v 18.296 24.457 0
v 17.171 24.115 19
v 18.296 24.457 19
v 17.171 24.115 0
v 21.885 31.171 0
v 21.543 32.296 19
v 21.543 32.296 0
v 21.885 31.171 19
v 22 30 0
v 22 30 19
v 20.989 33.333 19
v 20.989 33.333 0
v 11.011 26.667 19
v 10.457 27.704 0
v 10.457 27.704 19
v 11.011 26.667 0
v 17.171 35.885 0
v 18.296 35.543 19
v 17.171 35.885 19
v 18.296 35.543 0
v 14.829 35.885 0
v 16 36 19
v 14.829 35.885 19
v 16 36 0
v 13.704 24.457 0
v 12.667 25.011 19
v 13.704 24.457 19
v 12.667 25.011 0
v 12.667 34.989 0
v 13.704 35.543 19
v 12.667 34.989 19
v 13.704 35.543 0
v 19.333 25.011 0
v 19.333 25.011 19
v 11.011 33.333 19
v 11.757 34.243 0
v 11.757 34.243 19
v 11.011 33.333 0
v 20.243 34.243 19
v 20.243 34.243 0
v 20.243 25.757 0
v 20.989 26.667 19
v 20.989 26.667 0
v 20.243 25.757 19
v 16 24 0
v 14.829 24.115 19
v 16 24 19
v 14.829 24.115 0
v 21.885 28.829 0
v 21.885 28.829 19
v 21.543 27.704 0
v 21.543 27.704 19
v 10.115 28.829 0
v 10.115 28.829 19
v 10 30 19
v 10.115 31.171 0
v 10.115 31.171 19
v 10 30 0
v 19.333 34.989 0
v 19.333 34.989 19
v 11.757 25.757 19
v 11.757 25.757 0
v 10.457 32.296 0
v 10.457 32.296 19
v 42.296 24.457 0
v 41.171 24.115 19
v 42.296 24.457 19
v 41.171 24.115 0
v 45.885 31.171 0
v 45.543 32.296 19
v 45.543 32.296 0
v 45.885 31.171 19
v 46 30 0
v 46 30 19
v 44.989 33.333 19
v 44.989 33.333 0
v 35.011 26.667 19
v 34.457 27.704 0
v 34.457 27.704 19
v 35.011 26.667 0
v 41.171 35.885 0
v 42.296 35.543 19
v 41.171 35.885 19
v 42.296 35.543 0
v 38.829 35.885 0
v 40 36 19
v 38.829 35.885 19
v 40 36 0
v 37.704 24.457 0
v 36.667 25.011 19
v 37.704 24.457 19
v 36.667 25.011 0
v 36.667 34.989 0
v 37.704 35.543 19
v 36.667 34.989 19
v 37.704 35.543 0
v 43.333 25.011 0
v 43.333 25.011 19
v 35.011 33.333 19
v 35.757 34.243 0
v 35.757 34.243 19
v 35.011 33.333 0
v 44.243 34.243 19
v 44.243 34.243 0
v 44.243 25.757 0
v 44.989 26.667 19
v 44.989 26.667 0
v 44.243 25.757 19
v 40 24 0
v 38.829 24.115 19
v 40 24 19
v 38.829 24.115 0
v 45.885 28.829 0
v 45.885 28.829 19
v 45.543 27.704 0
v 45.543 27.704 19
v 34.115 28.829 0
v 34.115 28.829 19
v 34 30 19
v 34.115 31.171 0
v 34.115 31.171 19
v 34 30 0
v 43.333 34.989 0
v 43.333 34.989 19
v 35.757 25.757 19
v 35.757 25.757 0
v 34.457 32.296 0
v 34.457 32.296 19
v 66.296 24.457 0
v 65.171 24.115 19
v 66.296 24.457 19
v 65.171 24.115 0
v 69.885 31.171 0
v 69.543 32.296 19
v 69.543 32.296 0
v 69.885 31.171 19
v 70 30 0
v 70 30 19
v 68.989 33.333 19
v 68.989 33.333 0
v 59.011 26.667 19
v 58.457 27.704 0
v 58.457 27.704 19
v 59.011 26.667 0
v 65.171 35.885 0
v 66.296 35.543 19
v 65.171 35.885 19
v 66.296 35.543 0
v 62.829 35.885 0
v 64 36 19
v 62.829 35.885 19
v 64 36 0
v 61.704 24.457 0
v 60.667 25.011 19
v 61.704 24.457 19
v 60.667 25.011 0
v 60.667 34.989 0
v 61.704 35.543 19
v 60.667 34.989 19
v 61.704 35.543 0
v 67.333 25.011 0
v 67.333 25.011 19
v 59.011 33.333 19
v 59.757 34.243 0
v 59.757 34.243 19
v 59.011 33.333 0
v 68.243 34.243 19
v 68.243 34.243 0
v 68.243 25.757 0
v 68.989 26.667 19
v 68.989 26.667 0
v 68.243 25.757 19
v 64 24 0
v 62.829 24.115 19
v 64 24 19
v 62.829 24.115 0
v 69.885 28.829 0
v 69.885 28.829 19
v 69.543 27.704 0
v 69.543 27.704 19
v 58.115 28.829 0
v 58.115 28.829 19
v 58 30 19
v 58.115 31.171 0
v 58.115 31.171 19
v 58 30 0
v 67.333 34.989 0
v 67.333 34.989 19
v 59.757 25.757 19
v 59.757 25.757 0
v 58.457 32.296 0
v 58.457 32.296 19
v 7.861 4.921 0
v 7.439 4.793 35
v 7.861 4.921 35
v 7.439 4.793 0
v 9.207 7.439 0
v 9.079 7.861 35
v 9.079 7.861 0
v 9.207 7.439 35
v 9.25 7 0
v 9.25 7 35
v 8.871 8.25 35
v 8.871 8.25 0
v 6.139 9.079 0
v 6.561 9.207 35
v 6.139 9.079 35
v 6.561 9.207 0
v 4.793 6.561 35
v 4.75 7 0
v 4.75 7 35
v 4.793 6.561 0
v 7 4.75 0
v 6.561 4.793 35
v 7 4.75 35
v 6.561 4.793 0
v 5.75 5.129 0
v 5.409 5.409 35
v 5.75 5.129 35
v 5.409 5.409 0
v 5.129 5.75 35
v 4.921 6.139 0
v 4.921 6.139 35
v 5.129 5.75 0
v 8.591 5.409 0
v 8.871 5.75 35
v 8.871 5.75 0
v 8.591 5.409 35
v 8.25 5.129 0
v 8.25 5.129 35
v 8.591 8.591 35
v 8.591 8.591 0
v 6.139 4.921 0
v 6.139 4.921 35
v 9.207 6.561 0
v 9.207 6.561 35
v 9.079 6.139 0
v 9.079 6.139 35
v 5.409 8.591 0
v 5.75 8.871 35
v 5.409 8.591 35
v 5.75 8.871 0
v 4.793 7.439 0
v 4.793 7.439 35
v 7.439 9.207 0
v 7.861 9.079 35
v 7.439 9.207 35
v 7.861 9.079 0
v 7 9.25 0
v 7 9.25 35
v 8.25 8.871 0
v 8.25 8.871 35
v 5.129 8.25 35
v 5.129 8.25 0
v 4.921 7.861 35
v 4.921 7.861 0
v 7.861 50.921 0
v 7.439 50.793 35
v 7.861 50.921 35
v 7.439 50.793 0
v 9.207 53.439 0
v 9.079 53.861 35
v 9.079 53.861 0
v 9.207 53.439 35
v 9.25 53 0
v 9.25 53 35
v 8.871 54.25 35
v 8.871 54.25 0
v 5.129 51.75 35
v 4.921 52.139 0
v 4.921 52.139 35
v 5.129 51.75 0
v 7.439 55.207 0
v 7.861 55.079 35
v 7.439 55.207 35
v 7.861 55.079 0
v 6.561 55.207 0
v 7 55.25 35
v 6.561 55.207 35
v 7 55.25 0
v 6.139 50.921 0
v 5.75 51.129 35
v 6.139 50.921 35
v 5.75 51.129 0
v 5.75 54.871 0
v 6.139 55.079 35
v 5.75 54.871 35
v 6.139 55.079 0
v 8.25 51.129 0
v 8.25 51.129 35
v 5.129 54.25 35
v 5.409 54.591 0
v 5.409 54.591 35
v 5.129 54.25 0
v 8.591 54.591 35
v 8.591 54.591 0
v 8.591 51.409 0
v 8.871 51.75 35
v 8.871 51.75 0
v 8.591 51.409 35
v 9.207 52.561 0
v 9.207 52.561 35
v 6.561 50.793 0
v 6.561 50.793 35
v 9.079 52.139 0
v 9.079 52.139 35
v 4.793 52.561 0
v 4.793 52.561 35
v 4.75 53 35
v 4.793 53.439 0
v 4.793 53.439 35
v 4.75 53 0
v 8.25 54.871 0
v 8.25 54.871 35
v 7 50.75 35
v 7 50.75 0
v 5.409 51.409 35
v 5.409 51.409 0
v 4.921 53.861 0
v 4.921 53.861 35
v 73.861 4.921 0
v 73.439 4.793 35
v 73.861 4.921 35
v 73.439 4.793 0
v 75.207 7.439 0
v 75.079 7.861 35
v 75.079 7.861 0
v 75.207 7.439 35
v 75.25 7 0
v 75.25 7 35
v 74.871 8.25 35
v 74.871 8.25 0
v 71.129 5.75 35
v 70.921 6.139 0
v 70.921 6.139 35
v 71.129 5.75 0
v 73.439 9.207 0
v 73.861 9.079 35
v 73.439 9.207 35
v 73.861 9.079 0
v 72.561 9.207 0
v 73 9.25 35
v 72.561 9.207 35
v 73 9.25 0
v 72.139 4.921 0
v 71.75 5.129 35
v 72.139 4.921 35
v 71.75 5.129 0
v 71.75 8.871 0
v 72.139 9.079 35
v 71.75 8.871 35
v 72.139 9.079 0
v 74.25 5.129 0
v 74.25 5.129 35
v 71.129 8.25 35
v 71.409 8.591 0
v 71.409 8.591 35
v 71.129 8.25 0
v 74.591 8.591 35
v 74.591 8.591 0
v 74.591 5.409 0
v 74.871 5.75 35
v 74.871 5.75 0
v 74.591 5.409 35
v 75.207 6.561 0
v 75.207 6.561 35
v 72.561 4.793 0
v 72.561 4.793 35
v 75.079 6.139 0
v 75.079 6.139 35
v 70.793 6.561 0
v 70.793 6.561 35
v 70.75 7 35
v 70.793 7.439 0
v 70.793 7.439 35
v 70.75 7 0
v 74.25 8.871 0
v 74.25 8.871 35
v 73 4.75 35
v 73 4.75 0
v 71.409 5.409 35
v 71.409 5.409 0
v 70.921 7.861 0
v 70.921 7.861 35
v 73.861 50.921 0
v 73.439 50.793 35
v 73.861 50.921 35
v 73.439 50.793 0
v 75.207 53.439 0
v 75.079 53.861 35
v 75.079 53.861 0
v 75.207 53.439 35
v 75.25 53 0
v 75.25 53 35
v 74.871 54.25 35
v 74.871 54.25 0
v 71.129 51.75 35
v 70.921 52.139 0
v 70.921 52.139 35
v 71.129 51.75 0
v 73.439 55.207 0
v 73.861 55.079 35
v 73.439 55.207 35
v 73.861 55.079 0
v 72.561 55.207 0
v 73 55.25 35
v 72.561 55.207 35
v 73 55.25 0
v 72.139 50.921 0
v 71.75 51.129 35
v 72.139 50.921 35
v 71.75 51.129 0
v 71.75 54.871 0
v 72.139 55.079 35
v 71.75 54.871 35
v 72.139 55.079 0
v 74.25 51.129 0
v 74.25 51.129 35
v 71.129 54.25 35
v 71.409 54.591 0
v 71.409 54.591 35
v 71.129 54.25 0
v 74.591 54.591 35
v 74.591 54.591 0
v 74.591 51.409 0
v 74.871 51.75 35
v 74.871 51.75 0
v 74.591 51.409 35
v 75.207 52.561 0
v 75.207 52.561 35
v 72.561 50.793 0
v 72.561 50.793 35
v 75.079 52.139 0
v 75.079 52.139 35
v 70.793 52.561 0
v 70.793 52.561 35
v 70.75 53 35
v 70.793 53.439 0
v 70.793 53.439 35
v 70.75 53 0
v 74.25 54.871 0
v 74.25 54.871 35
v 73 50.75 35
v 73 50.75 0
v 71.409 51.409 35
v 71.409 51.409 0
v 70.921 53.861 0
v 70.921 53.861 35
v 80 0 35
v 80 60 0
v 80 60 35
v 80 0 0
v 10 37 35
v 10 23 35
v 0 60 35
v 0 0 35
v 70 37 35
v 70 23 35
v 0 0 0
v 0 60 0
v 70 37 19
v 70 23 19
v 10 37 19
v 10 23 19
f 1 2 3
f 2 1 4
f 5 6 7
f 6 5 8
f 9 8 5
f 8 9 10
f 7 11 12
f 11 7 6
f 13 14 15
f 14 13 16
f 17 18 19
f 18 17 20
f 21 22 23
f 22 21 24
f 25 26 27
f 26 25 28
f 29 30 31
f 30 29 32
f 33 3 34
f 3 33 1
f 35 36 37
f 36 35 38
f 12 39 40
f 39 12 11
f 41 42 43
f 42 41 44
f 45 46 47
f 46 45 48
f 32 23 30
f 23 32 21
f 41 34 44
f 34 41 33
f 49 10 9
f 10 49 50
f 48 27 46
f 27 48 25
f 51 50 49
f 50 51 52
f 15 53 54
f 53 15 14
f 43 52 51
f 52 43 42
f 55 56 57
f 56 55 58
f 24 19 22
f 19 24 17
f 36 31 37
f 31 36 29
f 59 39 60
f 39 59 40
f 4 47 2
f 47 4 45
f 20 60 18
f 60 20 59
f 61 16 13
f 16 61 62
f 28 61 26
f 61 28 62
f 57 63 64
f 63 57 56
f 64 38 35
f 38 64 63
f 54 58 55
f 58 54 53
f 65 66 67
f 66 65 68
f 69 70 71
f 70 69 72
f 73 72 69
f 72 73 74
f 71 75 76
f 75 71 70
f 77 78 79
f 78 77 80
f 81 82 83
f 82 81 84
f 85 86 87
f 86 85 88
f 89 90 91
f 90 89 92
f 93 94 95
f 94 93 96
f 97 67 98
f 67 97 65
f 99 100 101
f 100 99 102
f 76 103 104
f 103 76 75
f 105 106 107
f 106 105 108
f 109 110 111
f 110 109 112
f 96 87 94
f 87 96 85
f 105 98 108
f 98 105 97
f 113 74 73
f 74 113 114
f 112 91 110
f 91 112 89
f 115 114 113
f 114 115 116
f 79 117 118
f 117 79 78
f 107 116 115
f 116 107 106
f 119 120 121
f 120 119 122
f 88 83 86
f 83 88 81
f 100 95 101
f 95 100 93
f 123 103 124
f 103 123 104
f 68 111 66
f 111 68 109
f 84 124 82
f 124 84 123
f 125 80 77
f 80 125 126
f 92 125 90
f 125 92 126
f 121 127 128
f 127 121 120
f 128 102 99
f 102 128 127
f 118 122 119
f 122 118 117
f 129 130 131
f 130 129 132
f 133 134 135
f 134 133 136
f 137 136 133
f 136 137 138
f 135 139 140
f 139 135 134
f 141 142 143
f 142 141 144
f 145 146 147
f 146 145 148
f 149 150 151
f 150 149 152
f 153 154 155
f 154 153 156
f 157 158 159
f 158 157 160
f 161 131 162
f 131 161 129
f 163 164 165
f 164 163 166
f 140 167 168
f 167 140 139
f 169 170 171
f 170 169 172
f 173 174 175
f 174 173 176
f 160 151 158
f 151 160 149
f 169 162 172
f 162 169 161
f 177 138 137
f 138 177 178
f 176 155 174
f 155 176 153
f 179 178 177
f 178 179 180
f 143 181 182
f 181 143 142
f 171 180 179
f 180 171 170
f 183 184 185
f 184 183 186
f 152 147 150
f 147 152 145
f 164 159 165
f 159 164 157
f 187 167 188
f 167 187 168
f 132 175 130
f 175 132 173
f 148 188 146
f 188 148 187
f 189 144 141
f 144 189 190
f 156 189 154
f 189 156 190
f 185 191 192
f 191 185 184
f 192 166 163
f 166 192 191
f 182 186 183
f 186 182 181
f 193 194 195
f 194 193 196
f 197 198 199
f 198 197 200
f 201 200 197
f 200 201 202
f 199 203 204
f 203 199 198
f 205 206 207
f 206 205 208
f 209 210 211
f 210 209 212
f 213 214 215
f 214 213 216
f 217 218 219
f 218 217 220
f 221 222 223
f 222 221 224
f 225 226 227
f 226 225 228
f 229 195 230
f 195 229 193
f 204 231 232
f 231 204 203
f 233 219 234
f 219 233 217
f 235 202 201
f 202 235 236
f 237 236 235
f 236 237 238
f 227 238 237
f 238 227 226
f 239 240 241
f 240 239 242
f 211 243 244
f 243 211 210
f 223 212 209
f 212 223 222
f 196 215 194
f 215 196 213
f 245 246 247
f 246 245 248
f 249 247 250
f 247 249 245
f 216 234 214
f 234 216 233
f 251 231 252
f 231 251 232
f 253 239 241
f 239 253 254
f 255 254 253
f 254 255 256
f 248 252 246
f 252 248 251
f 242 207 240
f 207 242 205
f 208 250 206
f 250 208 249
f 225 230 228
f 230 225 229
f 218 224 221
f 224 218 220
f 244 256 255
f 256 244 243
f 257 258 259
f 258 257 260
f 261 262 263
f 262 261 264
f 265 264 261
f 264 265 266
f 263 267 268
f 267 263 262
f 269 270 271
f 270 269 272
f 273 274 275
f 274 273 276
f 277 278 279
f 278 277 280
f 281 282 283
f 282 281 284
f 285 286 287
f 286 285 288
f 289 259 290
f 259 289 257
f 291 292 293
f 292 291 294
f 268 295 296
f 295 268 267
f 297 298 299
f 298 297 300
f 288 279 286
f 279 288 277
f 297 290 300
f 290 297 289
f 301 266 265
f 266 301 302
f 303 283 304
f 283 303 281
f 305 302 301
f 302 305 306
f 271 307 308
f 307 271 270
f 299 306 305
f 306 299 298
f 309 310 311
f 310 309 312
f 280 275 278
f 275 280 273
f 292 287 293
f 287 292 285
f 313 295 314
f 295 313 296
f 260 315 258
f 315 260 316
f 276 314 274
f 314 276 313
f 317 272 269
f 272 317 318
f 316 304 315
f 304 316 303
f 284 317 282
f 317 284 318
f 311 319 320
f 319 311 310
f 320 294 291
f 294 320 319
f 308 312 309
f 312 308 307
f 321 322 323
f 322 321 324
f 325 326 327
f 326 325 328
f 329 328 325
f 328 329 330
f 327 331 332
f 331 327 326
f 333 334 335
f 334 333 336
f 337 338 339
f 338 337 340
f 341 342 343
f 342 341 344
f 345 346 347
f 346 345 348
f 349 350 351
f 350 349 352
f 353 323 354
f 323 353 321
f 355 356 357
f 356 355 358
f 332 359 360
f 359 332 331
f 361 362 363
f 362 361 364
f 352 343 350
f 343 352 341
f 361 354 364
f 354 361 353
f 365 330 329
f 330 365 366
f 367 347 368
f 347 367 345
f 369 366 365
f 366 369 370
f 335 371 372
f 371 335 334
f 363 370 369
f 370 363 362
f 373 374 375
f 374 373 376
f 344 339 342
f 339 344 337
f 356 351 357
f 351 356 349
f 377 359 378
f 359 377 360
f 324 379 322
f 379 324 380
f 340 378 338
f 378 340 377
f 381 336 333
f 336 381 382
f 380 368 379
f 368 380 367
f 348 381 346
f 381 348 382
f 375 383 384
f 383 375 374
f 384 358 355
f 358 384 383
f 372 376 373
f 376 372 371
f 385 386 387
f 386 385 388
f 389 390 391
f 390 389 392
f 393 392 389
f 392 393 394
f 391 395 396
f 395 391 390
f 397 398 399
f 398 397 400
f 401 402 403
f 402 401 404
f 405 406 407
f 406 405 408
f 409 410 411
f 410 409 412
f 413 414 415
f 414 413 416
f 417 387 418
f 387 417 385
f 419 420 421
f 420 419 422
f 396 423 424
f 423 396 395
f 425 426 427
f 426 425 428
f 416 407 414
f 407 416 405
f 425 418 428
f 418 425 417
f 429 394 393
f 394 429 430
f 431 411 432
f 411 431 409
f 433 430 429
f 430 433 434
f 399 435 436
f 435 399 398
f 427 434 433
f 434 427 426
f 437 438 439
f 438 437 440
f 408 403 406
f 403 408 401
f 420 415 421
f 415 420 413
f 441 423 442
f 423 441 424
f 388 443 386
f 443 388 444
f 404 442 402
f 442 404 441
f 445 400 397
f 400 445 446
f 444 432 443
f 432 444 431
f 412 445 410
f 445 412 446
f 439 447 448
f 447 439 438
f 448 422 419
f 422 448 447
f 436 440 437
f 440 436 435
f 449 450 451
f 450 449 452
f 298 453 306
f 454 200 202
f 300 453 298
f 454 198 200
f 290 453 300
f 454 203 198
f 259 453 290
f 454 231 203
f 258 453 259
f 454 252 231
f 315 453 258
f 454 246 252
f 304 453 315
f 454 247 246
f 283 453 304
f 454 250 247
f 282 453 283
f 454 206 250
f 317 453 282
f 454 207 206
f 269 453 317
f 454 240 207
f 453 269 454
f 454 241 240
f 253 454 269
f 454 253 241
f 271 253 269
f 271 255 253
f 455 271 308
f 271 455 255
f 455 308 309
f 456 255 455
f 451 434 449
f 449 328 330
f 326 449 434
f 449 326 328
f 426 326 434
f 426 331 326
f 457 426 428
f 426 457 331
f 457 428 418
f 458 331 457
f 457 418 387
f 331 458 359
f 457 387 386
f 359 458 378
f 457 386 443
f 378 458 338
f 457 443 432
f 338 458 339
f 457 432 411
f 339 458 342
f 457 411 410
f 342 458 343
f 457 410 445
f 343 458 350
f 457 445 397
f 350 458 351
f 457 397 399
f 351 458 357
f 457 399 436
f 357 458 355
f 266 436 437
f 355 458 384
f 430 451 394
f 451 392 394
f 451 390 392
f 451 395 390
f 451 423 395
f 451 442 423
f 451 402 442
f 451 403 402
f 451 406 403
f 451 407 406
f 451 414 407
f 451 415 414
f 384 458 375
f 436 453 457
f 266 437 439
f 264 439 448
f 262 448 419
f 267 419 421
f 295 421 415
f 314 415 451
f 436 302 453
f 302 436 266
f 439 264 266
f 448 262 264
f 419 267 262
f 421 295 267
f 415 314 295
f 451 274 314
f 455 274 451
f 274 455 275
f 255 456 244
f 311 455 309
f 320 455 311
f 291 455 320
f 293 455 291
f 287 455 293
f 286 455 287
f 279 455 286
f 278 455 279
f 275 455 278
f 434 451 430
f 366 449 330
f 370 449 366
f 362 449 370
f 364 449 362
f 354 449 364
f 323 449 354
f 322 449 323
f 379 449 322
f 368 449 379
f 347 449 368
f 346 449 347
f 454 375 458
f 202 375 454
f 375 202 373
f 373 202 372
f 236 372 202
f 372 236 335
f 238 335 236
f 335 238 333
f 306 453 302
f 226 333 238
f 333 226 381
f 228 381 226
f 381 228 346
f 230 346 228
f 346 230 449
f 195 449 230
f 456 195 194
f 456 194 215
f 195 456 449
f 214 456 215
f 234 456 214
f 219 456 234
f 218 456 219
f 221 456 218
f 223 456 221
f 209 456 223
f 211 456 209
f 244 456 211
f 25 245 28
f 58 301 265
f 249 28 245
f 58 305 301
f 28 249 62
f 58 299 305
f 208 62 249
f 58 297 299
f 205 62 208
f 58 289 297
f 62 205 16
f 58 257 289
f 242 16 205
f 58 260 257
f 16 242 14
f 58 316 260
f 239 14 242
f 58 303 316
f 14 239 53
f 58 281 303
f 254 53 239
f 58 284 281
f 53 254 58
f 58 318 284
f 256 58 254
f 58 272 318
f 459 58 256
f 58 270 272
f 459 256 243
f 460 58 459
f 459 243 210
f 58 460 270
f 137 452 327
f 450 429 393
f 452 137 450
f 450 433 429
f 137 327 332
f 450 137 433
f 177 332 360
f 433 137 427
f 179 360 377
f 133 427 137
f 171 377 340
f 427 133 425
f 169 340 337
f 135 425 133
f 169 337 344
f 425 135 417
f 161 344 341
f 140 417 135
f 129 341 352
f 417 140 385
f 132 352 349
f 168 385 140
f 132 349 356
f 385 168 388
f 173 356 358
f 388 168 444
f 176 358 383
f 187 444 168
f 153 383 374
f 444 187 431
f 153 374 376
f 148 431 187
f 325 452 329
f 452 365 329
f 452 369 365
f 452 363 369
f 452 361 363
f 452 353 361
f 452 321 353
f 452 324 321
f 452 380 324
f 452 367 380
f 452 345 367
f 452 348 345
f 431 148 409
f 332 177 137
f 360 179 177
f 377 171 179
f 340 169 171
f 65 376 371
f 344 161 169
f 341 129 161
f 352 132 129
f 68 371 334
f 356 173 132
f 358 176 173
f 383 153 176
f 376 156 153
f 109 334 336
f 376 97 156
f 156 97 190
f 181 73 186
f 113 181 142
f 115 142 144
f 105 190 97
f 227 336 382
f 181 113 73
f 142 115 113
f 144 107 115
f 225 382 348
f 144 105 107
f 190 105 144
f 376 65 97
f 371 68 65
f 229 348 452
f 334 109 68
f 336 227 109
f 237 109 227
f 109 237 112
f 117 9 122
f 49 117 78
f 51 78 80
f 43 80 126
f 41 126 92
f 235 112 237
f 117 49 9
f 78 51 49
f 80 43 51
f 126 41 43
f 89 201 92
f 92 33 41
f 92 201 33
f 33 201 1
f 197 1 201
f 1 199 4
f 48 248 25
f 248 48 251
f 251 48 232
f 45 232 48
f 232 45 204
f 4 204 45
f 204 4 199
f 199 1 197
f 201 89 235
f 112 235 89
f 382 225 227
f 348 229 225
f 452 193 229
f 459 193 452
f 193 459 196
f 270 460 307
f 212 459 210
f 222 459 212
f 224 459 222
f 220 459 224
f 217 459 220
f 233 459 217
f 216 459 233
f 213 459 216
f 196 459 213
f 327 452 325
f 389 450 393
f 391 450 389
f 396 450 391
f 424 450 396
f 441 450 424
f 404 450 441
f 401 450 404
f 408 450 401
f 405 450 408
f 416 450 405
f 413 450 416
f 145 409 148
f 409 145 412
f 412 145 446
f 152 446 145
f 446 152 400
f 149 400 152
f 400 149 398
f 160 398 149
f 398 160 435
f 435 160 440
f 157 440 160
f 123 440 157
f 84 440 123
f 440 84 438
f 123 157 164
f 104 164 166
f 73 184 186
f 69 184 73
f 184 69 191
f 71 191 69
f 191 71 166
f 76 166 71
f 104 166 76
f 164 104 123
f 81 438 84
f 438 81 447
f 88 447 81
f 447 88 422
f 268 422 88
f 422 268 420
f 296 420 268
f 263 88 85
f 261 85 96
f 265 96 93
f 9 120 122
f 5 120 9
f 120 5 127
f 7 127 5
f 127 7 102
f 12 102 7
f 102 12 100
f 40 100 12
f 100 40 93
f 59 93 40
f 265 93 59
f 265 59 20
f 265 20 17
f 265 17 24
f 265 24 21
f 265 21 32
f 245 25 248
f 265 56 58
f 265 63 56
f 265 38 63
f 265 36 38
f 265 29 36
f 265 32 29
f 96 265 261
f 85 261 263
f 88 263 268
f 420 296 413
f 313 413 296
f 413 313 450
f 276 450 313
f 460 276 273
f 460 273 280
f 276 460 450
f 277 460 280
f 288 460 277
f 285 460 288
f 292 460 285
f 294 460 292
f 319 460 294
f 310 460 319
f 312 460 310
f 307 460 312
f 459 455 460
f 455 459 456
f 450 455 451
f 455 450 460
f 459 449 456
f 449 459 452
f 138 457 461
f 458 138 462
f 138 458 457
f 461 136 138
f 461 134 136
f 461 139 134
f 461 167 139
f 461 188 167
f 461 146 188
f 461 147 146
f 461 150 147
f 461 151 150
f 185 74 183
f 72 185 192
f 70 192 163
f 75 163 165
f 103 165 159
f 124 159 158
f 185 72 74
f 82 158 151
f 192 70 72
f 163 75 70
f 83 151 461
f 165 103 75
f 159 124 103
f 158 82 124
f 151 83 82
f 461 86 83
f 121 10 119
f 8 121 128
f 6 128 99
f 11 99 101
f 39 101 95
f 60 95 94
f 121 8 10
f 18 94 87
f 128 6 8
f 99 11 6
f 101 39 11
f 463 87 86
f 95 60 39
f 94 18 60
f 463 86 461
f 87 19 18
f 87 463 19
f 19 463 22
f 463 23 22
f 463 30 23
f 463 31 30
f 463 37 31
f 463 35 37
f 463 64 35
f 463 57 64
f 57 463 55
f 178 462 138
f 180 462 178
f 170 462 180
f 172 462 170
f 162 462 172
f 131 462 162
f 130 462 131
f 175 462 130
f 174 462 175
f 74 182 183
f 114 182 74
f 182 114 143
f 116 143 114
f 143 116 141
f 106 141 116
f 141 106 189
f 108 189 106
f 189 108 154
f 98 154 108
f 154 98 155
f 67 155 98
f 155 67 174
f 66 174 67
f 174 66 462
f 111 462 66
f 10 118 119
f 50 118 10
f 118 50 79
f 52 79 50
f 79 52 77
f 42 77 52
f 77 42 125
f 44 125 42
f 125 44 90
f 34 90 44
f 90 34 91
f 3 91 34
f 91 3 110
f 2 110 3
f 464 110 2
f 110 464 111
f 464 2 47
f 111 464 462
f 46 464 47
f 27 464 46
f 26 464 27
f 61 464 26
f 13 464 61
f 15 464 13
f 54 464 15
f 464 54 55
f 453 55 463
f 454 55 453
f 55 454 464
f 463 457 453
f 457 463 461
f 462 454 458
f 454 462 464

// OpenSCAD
$fn = 32;

// ----------------------------------------------------------------------
// Manifold block: gallery_top manifold
// ----------------------------------------------------------------------

// --- parameters (mm) ---
block_l = 80;             // block length, X
block_w = 60;             // block width, Y
block_h = 35;             // block height, Z
port_d = 12;              // port bore diameter
port_pitch = 24;          // port pitch along X
gallery_d = 14;           // top gallery width, Y
gallery_depth = 16;       // gallery pocket depth
wall_p = 10;              // gallery end wall thickness, X
mnt_d = 4.5;              // mounting hole diameter
mnt_in = 7;               // mounting hole inset from the edges

n_ports = 3;  // ports in the row
port_x0 = (block_l - (n_ports - 1) * port_pitch) / 2;  // first port X

difference() {
  cube([block_l, block_w, block_h]);
  for (i = [0 : n_ports - 1])
    translate([port_x0 + i * port_pitch, block_w / 2, -1])
      cylinder(h = block_h + 2, d = port_d);
  translate([wall_p, block_w / 2 - gallery_d / 2, block_h - gallery_depth])
    cube([block_l - 2 * wall_p, gallery_d, gallery_depth + 1]);
  for (cx = [mnt_in, block_l - mnt_in])
    for (cy = [mnt_in, block_w - mnt_in])
      translate([cx, cy, -1]) cylinder(h = block_h + 2, d = mnt_d);
}
